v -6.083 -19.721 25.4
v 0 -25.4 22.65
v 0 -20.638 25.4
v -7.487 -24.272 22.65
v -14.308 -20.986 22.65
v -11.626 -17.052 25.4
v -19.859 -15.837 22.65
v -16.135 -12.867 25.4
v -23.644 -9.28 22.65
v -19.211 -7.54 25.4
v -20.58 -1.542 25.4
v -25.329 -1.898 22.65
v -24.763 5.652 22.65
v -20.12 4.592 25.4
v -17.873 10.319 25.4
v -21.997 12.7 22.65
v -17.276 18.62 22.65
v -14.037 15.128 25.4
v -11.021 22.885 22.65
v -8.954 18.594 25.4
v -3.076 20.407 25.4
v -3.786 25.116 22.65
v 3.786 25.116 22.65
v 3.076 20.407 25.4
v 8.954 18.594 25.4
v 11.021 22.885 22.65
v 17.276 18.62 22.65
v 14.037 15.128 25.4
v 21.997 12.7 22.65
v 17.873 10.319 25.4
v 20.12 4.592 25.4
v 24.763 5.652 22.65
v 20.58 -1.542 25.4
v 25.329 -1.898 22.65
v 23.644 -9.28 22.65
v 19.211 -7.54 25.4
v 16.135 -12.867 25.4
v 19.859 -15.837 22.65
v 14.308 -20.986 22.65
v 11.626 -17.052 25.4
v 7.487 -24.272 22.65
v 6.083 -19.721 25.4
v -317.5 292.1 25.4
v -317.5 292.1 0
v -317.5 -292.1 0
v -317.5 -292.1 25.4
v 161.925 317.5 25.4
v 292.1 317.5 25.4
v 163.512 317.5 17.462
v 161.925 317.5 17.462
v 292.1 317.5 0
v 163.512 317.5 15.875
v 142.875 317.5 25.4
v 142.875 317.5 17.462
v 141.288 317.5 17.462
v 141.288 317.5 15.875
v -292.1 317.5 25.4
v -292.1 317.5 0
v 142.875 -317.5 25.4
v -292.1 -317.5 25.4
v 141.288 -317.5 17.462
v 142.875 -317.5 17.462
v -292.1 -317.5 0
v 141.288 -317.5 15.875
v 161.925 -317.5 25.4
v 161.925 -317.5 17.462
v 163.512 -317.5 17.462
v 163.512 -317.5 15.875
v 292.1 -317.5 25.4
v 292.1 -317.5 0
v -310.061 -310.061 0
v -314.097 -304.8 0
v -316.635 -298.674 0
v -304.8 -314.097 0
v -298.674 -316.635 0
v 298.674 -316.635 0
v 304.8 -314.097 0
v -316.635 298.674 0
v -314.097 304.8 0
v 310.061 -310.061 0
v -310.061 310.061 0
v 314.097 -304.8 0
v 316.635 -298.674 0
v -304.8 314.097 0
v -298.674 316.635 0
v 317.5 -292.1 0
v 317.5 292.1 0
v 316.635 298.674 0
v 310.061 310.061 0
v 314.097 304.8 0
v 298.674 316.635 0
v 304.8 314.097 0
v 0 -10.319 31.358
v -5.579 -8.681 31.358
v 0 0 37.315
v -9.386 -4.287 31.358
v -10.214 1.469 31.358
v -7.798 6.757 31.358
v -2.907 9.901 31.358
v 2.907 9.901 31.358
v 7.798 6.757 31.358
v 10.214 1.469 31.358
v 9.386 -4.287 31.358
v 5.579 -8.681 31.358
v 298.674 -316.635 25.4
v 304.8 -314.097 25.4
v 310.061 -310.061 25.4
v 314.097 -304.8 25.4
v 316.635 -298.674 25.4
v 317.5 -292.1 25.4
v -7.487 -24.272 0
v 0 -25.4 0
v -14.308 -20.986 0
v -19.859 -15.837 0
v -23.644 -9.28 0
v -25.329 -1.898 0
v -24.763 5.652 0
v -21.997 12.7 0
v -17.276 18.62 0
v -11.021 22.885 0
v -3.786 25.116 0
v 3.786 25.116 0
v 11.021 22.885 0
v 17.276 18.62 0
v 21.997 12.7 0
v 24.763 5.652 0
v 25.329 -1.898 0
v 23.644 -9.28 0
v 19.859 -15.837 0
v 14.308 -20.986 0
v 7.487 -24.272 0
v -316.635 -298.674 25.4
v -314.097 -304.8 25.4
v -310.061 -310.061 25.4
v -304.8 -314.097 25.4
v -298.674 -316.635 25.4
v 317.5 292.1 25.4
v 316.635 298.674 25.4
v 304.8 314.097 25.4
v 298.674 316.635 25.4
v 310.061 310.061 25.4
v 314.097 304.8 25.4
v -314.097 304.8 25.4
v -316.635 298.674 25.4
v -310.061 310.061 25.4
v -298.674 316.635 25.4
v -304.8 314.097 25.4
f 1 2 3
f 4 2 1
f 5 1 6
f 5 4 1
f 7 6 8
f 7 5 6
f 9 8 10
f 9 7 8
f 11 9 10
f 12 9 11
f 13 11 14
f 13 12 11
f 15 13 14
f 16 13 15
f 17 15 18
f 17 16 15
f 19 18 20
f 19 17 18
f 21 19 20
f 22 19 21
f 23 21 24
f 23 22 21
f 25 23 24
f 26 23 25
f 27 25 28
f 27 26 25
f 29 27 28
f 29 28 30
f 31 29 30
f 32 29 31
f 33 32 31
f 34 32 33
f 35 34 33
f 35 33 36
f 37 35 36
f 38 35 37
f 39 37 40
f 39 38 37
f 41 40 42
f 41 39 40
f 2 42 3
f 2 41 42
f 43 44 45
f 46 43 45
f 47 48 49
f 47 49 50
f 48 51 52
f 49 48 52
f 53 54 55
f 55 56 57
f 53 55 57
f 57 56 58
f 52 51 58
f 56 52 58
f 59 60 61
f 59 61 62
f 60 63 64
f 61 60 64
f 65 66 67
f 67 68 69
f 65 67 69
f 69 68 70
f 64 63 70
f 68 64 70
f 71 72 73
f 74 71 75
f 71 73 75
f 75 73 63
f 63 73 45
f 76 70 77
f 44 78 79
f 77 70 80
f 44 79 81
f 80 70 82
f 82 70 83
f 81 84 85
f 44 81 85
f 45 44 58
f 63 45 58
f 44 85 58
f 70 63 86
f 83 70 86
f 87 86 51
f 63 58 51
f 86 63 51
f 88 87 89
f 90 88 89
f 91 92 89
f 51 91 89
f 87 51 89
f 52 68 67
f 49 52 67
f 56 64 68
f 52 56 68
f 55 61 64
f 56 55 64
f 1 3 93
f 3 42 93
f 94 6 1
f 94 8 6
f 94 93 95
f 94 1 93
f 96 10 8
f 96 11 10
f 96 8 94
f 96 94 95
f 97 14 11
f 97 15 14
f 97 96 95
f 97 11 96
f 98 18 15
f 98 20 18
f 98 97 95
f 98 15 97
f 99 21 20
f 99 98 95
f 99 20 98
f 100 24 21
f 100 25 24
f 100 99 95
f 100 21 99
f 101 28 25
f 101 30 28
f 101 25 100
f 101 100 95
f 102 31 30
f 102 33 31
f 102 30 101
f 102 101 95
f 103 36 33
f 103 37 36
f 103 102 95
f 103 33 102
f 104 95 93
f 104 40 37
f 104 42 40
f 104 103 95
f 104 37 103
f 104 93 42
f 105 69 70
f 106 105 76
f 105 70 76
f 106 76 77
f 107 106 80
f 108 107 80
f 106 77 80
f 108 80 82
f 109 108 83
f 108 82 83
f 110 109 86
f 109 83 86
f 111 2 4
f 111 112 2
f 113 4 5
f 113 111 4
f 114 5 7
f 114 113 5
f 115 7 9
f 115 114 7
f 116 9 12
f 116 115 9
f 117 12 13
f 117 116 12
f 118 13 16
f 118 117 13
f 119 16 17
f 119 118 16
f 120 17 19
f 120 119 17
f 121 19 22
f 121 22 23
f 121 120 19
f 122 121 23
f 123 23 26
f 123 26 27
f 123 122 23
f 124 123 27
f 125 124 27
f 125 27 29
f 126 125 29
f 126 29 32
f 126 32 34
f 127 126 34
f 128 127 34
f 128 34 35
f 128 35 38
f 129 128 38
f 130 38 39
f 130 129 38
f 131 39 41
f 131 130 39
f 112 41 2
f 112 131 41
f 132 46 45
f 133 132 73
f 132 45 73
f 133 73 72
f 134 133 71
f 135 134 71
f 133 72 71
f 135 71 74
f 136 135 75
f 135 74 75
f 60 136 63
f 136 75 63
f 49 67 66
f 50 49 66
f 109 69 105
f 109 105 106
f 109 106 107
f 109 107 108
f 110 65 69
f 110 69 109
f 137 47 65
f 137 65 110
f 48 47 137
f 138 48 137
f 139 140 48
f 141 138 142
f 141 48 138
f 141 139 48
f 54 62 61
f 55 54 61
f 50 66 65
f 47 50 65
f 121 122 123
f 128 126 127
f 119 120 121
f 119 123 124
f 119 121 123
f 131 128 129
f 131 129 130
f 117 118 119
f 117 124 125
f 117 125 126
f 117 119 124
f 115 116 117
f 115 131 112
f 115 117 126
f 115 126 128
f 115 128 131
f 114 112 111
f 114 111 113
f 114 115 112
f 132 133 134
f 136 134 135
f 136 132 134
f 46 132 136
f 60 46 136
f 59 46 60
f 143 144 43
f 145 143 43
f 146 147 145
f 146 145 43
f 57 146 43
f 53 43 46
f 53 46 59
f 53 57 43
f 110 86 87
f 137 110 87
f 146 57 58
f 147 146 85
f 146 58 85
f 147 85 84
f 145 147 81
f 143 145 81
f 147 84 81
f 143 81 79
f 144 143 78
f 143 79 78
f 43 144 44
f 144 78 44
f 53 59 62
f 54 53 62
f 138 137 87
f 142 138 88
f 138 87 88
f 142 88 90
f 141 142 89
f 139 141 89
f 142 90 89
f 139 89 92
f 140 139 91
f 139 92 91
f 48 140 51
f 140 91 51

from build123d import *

# Parameters (mm, degrees)
F1_DEPTH = 25.4
F5_DEPTH = 635.001


with BuildPart() as f1:
    # F0 (on Top) → F1 (new body)
    with BuildSketch(Plane.XY):
        with BuildLine():
            Line((292.1, 317.5), (-292.1, 317.5))
            ThreePointArc((-292.1, 317.5), (-310.0605122421, 310.0605122421), (-317.5, 292.1))
            Line((-317.5, 292.1), (-317.5, -292.1))
            ThreePointArc((-317.5, -292.1), (-310.0605122421, -310.0605122421), (-292.1, -317.5))
            Line((-292.1, -317.5), (292.1, -317.5))
            ThreePointArc((292.1, -317.5), (310.0605122421, -310.0605122421), (317.5, -292.1))
            Line((317.5, -292.1), (317.5, 292.1))
            ThreePointArc((317.5, 292.1), (310.0605122421, 310.0605122421), (292.1, 317.5))
        make_face()
    extrude(amount=F1_DEPTH)

    # F4 (on face) → F5 (cut, through all)
    with BuildSketch(Plane.XZ.offset(317.5)):
        Polygon((161.925, 25.4), (142.875, 25.4), (142.875, 17.4625), (141.2875, 17.4625), (141.2875, 15.875), (163.5125, 15.875), (163.5125, 17.4625), (161.925, 17.4625), align=None)
    extrude(amount=-F5_DEPTH, mode=Mode.SUBTRACT)


with BuildPart() as f3:
    # F2 (on Right) → F3 (revolve)
    with BuildSketch(Plane.YZ):
        Polygon((0, 25.4), (0, 37.3150661804), (-20.6375, 25.4), align=None)
        Polygon((0, 25.4), (-20.6375, 25.4), (-25.4, 22.650369343), (-25.4, 0), (0, 0), align=None)
    revolve(axis=Axis((0, 0, 18.6575330902), (0, 0, -1)))


solid = Compound([f1.part, f3.part])
